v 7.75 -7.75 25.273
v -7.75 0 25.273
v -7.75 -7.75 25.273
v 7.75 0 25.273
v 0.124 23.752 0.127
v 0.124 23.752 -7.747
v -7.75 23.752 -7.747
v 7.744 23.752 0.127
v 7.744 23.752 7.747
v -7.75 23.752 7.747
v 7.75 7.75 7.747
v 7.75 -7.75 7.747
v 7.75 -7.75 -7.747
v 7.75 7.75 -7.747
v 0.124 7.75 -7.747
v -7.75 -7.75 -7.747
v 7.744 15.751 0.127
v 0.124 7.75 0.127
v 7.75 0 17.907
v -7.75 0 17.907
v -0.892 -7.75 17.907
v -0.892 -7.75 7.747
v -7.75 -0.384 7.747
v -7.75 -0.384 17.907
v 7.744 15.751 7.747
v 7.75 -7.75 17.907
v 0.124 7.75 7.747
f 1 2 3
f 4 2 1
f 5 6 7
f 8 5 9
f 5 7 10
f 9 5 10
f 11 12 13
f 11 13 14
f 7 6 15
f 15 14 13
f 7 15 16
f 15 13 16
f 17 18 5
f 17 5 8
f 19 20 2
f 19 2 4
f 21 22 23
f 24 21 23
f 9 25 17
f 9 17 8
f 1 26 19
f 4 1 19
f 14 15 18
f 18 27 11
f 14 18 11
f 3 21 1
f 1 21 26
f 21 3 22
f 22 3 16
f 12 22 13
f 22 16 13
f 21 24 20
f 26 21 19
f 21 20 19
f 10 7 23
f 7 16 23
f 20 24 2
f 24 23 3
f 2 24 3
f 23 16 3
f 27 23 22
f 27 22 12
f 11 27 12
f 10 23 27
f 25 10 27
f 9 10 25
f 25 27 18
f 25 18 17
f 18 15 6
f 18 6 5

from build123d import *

# Parameters (mm, degrees)
F0_W      = 15.5
F0_H      = 15.5
F1_DEPTH  = 7.747
F3_DEPTH  = 10.16
F4_W      = 15.5
F4_H      = 7.75
F5_DEPTH  = 7.366
F6_W      = 7.874
F6_H      = 15.494
F7_DEPTH  = 16.002
F8_W      = 8.001
F8_H      = 7.62
F9_DEPTH  = 7.62
F11_DEPTH = 7.62


with BuildPart() as f1:
    # F0 (on Top) → F1 (new body, symmetric)
    with BuildSketch(Plane.XY):
        Rectangle(F0_W, F0_H)
    extrude(amount=F1_DEPTH, both=True)

    # F2 (on face) → F3 (join)
    with BuildSketch(Plane.XY.offset(7.747)):
        Polygon((-7.75, -0.384), (-7.75, -7.75), (-0.892, -7.75), align=None)
    extrude(amount=F3_DEPTH)

    # F4 (on face) → F5 (join)
    with BuildSketch(Plane.XY.offset(17.907)):
        with Locations((0, -3.875)):
            Rectangle(F4_W, F4_H)
    extrude(amount=F5_DEPTH)

    # F6 (on face) → F7 (join)
    with BuildSketch(Plane(origin=(0, 7.75, 0), x_dir=(-1, 0, 0), z_dir=(0, 1, 0))):
        with Locations((3.813, 0)):
            Rectangle(F6_W, F6_H)
    extrude(amount=F7_DEPTH)

    # F8 (on face) → F9 (join)
    with BuildSketch(Plane.YZ.offset(0.124)):
        with Locations((19.7515, 3.937)):
            Rectangle(F8_W, F8_H)
    extrude(amount=F9_DEPTH)

    # F10 (on face) → F11 (join)
    with BuildSketch(Plane.XY.offset(7.747)):
        Polygon((0.124, 7.75), (7.744, 15.751), (0.124, 15.751), align=None)
    extrude(amount=-F11_DEPTH)


solid = f1.part
